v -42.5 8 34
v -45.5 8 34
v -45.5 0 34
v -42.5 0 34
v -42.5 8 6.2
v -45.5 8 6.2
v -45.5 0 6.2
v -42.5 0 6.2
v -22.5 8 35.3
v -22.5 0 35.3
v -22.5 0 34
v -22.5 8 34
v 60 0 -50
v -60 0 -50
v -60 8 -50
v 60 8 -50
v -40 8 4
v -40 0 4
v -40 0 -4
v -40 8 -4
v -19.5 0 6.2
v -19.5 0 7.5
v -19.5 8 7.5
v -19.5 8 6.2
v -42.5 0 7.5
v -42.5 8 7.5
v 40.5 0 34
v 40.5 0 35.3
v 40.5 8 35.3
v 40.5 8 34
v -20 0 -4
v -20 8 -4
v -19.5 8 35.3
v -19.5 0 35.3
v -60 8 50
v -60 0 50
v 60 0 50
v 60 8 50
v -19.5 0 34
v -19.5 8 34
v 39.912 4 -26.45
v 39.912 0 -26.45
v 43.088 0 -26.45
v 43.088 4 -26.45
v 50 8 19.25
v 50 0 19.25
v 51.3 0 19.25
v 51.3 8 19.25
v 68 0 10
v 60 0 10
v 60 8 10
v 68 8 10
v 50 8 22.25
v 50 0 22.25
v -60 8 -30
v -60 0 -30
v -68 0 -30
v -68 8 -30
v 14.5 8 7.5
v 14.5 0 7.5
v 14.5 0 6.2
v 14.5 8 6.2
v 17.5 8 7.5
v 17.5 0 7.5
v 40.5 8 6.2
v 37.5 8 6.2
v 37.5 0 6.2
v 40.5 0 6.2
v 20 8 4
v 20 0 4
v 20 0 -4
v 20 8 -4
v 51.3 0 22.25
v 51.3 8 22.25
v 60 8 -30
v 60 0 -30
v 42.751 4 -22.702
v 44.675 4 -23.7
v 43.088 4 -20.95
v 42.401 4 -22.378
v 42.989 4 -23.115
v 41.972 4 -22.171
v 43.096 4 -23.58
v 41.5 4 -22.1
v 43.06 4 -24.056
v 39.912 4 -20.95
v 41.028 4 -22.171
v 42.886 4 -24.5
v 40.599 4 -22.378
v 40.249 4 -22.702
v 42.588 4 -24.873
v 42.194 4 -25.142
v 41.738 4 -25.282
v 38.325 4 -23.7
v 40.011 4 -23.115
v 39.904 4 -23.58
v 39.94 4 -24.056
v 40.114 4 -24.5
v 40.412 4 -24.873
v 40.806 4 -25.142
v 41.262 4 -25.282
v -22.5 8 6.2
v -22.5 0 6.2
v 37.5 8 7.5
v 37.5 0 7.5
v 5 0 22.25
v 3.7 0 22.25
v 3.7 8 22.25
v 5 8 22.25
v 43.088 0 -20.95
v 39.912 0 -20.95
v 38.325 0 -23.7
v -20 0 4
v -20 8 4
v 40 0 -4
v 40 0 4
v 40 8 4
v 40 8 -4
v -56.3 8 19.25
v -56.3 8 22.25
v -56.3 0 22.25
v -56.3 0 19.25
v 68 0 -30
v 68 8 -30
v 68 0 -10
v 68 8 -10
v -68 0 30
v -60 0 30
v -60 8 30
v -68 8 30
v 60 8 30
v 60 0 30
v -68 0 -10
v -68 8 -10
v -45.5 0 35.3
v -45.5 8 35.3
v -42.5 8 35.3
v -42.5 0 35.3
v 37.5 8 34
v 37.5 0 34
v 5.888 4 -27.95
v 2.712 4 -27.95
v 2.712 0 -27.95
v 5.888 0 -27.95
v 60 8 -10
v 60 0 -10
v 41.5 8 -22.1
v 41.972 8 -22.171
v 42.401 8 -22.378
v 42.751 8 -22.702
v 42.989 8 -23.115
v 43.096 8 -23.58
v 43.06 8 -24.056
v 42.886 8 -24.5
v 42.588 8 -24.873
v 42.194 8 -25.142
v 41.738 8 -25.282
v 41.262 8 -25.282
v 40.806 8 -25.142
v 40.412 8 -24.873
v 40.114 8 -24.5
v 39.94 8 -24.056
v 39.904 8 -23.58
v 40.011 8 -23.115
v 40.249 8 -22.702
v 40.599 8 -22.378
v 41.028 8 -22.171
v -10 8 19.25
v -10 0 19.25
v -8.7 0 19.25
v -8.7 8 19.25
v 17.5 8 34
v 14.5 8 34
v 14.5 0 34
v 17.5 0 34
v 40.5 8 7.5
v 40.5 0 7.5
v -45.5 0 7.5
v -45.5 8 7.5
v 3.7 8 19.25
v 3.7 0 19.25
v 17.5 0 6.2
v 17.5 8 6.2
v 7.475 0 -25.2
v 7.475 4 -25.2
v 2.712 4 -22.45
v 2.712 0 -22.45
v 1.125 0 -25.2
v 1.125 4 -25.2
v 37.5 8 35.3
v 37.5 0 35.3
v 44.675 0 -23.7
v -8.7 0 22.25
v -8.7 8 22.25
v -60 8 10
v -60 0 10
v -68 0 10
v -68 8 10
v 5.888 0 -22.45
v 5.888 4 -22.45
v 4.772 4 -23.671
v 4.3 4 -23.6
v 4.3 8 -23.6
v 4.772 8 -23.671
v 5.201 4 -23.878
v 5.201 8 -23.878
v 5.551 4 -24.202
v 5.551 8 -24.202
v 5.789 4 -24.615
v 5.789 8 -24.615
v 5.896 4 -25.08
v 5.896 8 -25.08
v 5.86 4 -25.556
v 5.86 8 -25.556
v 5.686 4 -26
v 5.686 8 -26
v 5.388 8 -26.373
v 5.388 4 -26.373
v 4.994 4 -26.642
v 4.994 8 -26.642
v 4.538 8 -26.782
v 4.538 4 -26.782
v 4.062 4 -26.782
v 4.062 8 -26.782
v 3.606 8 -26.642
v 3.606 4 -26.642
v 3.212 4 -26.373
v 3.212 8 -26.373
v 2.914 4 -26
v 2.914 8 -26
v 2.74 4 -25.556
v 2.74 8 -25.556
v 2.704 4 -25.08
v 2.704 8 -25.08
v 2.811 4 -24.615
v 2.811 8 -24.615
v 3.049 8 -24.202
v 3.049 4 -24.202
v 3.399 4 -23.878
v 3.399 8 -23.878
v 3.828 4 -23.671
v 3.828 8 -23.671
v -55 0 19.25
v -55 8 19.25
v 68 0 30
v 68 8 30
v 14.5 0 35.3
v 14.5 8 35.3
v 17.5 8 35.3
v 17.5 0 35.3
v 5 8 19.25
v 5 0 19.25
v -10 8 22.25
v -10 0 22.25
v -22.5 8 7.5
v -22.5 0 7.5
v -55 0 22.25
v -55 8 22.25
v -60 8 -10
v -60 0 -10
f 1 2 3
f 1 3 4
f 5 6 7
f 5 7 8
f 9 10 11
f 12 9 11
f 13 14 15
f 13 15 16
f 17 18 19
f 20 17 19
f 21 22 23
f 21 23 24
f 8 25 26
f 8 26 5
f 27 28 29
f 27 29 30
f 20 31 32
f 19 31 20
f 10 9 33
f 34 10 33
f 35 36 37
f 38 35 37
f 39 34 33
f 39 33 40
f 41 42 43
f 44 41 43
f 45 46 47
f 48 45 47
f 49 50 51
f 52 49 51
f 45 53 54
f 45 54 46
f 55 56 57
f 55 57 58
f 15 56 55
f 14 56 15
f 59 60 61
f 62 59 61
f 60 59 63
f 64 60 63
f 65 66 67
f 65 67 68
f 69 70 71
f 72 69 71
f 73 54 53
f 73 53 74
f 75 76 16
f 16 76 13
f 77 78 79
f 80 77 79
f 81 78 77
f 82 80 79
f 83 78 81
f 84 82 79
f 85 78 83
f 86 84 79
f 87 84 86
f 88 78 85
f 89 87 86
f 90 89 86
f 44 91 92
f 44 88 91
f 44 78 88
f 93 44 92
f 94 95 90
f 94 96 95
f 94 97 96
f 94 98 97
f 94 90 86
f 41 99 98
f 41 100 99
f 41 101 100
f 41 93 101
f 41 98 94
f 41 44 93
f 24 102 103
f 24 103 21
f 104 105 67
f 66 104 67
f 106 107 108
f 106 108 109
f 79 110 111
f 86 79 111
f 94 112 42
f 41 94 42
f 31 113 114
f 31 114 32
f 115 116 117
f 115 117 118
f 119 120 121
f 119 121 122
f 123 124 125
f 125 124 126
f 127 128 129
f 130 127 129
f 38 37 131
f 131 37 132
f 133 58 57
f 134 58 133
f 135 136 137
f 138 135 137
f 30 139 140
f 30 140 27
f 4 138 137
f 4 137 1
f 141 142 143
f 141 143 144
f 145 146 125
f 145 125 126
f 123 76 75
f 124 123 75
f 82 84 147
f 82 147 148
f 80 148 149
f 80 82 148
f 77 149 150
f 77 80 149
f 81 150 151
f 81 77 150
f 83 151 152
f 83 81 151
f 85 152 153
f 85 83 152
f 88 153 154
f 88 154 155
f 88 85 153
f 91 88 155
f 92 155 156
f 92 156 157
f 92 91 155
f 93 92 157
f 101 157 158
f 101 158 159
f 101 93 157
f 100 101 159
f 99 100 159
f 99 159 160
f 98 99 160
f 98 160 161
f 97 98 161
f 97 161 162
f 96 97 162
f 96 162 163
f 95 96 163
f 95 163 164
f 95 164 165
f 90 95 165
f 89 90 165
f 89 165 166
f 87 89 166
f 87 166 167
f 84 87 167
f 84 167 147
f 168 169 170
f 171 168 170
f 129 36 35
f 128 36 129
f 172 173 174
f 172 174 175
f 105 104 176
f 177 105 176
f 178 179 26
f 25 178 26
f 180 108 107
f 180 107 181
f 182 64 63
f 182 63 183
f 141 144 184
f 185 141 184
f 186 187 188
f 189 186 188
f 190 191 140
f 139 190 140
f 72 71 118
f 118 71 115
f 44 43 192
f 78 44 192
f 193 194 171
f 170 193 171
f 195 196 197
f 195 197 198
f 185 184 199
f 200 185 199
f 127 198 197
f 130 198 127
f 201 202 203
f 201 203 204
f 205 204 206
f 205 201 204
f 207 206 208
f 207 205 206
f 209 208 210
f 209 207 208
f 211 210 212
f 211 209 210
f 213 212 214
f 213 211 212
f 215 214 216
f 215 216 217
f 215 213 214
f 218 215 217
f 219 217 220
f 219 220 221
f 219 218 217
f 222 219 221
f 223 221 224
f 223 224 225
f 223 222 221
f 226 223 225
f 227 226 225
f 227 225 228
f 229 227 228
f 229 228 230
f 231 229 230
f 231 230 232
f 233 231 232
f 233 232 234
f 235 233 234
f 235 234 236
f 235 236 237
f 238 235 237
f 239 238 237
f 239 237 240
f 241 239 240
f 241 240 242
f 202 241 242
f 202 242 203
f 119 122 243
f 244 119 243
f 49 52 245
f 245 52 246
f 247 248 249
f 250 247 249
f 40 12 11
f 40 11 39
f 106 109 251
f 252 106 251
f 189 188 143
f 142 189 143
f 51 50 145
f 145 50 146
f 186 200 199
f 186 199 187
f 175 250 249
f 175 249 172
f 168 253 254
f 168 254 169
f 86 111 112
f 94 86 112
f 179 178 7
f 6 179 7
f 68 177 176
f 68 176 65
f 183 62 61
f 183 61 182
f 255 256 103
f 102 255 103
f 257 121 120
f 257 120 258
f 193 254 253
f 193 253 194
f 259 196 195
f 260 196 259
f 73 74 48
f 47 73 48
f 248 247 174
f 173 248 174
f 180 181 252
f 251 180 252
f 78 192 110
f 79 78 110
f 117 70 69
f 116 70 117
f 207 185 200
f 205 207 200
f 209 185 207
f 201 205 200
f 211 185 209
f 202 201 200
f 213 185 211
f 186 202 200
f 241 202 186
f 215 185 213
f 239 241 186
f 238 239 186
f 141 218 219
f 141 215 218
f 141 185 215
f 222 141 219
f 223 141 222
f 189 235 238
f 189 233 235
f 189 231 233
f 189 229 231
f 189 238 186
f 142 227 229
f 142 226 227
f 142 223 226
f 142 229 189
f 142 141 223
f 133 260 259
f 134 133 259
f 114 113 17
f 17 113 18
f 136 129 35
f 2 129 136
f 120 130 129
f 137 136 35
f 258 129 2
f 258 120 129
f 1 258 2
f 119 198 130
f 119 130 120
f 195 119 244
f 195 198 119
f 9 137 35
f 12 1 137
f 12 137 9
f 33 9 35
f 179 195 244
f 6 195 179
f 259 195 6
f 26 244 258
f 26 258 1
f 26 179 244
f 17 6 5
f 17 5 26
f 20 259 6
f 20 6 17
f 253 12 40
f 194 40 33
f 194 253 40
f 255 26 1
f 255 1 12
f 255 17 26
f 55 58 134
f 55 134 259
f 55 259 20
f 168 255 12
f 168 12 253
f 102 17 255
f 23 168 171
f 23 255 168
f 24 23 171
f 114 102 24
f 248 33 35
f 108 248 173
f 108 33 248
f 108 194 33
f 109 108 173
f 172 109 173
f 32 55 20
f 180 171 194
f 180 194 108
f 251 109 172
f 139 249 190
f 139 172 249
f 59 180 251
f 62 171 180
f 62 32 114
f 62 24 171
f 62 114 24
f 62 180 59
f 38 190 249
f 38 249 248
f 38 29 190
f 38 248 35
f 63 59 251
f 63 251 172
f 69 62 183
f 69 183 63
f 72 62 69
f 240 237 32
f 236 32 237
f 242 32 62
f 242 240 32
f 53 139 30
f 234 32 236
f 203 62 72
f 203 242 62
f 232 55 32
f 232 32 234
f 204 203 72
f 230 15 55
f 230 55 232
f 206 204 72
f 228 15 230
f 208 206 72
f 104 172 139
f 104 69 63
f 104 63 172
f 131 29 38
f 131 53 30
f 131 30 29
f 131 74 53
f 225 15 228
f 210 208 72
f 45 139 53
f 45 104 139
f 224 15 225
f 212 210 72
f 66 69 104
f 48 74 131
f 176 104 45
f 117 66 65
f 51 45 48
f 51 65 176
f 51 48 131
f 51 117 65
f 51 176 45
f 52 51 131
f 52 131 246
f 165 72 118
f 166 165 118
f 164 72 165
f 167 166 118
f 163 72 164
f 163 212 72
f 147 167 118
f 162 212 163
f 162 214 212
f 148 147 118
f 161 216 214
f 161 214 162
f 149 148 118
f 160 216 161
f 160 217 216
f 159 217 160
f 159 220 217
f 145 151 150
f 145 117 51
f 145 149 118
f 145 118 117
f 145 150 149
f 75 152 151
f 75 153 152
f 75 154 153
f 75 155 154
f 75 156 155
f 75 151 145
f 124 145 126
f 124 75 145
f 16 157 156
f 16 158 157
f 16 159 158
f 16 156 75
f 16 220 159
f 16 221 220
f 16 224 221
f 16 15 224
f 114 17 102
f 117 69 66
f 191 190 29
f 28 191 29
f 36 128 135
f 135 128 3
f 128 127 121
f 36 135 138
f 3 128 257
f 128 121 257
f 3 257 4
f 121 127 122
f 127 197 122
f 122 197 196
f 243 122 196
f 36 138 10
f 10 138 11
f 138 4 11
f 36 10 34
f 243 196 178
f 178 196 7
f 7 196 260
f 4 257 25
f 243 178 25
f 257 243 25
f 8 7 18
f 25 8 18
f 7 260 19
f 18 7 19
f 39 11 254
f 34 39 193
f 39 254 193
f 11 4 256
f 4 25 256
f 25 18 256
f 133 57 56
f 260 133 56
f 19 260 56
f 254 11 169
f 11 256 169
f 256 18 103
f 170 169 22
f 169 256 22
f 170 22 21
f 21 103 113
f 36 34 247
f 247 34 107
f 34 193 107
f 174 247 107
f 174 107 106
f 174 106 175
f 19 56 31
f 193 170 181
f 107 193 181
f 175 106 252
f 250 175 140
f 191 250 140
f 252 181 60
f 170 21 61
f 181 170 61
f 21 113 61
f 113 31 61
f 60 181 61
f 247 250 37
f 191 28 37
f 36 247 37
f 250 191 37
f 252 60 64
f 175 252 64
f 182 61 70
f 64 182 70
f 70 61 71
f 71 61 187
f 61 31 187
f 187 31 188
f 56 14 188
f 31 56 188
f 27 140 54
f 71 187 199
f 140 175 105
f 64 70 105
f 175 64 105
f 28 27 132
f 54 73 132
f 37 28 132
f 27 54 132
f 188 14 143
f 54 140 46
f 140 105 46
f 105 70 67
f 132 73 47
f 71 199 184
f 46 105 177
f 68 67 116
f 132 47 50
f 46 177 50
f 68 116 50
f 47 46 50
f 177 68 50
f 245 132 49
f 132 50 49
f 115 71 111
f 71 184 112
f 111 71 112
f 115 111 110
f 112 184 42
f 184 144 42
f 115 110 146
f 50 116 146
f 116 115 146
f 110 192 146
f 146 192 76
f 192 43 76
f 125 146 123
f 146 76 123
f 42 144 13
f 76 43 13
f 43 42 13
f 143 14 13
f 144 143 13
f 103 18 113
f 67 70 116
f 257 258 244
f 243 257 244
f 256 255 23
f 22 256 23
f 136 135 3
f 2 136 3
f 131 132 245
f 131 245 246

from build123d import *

# Parameters (mm, degrees)
SKETCH1_W           = 120
SKETCH1_H           = 100
SKETCH1_R           = 1.6
SKETCH1_W_2         = 3
SKETCH1_H_2         = 1.3
SKETCH1_W_3         = 1.3
SKETCH1_H_3         = 3
BOSS_EXTRUDE1_DEPTH = 8
CUT_EXTRUDE1_DEPTH  = 4
SKETCH3_W           = 20
SKETCH3_H           = 8
BOSS_EXTRUDE2_DEPTH = 8
CUT_EXTRUDE3_REACH  = 86.782
SKETCH5_W           = 20
SKETCH5_H           = 8


with BuildPart() as part:
    # Sketch1 → Boss-Extrude1 (new body)
    with BuildSketch(Plane(origin=(0, 0, 0), x_dir=(1, 0, 0), z_dir=(0, 1, 0))):
        Rectangle(SKETCH1_W, SKETCH1_H)
        with Locations(Location((41.5, 23.7, 0), (0, 0, 270))):
            Circle(SKETCH1_R, mode=Mode.SUBTRACT)
        with Locations(Location((4.3, 25.2, 0), (0, 0, 270))):
            Circle(SKETCH1_R, mode=Mode.SUBTRACT)
        with Locations((39, -6.85)):
            Rectangle(SKETCH1_W_2, SKETCH1_H_2, mode=Mode.SUBTRACT)
        with Locations((16, -6.85)):
            Rectangle(SKETCH1_W_2, SKETCH1_H_2, mode=Mode.SUBTRACT)
        with Locations((4.35, -20.75)):
            Rectangle(SKETCH1_W_3, SKETCH1_H_3, mode=Mode.SUBTRACT)
        with Locations((50.65, -20.75)):
            Rectangle(SKETCH1_W_3, SKETCH1_H_3, mode=Mode.SUBTRACT)
        with Locations((39, -34.65)):
            Rectangle(SKETCH1_W_2, SKETCH1_H_2, mode=Mode.SUBTRACT)
        with Locations((16, -34.65)):
            Rectangle(SKETCH1_W_2, SKETCH1_H_2, mode=Mode.SUBTRACT)
        with Locations((-21, -34.65)):
            Rectangle(SKETCH1_W_2, SKETCH1_H_2, mode=Mode.SUBTRACT)
        with Locations((-44, -34.65)):
            Rectangle(SKETCH1_W_2, SKETCH1_H_2, mode=Mode.SUBTRACT)
        with Locations((-55.65, -20.75)):
            Rectangle(SKETCH1_W_3, SKETCH1_H_3, mode=Mode.SUBTRACT)
        with Locations((-44, -6.85)):
            Rectangle(SKETCH1_W_2, SKETCH1_H_2, mode=Mode.SUBTRACT)
        with Locations((-9.35, -20.75)):
            Rectangle(SKETCH1_W_3, SKETCH1_H_3, mode=Mode.SUBTRACT)
        with Locations((-21, -6.85)):
            Rectangle(SKETCH1_W_2, SKETCH1_H_2, mode=Mode.SUBTRACT)
    extrude(amount=BOSS_EXTRUDE1_DEPTH)

    # Sketch2 → Cut-Extrude1 (cut)
    with BuildSketch(Plane(origin=(0, 0, 0), x_dir=(-1, 0, 0), z_dir=(0, -1, 0))):
        Polygon((-7.475426481, 25.2), (-5.88771324, 22.45), (-2.71228676, 22.45), (-1.124573519, 25.2), (-2.71228676, 27.95), (-5.88771324, 27.95), align=None)
        Polygon((-44.675426481, 23.7), (-43.08771324, 20.95), (-39.91228676, 20.95), (-38.324573519, 23.7), (-39.91228676, 26.45), (-43.08771324, 26.45), align=None)
    extrude(amount=-CUT_EXTRUDE1_DEPTH, mode=Mode.SUBTRACT)

    # Sketch3 → Boss-Extrude2 (add)
    with BuildSketch(Plane.ZY.offset(60)):
        with Locations((-20, 4)):
            Rectangle(SKETCH3_W, SKETCH3_H)
        with Locations((20, 4)):
            Rectangle(SKETCH3_W, SKETCH3_H)
    boss_extrude2 = extrude(amount=BOSS_EXTRUDE2_DEPTH)

    # Mirror1: Boss-Extrude2 across plane
    add(boss_extrude2.mirror(Plane.ZY))

    # Sketch5 → Cut-Extrude3 (cut, up to next)
    with BuildSketch(Plane(origin=(0, 0, 0), x_dir=(-1, 0, 0), z_dir=(0, -1, 0)), mode=Mode.PRIVATE) as cut_extrude3_sk1:
        with Locations((30, 0)):
            Rectangle(SKETCH5_W, SKETCH5_H)
    cut_extrude3_tool1 = extrude(cut_extrude3_sk1.sketch, amount=-CUT_EXTRUDE3_REACH, mode=Mode.PRIVATE) & part.part
    cut_extrude3 = cut_extrude3_tool1.solids().sort_by_distance((-30, 0, 0))[0]
    add(cut_extrude3, mode=Mode.SUBTRACT)

    # Mirror2: Cut-Extrude3 across plane
    add(cut_extrude3.mirror(Plane.ZY), mode=Mode.SUBTRACT)


solid = part.part
